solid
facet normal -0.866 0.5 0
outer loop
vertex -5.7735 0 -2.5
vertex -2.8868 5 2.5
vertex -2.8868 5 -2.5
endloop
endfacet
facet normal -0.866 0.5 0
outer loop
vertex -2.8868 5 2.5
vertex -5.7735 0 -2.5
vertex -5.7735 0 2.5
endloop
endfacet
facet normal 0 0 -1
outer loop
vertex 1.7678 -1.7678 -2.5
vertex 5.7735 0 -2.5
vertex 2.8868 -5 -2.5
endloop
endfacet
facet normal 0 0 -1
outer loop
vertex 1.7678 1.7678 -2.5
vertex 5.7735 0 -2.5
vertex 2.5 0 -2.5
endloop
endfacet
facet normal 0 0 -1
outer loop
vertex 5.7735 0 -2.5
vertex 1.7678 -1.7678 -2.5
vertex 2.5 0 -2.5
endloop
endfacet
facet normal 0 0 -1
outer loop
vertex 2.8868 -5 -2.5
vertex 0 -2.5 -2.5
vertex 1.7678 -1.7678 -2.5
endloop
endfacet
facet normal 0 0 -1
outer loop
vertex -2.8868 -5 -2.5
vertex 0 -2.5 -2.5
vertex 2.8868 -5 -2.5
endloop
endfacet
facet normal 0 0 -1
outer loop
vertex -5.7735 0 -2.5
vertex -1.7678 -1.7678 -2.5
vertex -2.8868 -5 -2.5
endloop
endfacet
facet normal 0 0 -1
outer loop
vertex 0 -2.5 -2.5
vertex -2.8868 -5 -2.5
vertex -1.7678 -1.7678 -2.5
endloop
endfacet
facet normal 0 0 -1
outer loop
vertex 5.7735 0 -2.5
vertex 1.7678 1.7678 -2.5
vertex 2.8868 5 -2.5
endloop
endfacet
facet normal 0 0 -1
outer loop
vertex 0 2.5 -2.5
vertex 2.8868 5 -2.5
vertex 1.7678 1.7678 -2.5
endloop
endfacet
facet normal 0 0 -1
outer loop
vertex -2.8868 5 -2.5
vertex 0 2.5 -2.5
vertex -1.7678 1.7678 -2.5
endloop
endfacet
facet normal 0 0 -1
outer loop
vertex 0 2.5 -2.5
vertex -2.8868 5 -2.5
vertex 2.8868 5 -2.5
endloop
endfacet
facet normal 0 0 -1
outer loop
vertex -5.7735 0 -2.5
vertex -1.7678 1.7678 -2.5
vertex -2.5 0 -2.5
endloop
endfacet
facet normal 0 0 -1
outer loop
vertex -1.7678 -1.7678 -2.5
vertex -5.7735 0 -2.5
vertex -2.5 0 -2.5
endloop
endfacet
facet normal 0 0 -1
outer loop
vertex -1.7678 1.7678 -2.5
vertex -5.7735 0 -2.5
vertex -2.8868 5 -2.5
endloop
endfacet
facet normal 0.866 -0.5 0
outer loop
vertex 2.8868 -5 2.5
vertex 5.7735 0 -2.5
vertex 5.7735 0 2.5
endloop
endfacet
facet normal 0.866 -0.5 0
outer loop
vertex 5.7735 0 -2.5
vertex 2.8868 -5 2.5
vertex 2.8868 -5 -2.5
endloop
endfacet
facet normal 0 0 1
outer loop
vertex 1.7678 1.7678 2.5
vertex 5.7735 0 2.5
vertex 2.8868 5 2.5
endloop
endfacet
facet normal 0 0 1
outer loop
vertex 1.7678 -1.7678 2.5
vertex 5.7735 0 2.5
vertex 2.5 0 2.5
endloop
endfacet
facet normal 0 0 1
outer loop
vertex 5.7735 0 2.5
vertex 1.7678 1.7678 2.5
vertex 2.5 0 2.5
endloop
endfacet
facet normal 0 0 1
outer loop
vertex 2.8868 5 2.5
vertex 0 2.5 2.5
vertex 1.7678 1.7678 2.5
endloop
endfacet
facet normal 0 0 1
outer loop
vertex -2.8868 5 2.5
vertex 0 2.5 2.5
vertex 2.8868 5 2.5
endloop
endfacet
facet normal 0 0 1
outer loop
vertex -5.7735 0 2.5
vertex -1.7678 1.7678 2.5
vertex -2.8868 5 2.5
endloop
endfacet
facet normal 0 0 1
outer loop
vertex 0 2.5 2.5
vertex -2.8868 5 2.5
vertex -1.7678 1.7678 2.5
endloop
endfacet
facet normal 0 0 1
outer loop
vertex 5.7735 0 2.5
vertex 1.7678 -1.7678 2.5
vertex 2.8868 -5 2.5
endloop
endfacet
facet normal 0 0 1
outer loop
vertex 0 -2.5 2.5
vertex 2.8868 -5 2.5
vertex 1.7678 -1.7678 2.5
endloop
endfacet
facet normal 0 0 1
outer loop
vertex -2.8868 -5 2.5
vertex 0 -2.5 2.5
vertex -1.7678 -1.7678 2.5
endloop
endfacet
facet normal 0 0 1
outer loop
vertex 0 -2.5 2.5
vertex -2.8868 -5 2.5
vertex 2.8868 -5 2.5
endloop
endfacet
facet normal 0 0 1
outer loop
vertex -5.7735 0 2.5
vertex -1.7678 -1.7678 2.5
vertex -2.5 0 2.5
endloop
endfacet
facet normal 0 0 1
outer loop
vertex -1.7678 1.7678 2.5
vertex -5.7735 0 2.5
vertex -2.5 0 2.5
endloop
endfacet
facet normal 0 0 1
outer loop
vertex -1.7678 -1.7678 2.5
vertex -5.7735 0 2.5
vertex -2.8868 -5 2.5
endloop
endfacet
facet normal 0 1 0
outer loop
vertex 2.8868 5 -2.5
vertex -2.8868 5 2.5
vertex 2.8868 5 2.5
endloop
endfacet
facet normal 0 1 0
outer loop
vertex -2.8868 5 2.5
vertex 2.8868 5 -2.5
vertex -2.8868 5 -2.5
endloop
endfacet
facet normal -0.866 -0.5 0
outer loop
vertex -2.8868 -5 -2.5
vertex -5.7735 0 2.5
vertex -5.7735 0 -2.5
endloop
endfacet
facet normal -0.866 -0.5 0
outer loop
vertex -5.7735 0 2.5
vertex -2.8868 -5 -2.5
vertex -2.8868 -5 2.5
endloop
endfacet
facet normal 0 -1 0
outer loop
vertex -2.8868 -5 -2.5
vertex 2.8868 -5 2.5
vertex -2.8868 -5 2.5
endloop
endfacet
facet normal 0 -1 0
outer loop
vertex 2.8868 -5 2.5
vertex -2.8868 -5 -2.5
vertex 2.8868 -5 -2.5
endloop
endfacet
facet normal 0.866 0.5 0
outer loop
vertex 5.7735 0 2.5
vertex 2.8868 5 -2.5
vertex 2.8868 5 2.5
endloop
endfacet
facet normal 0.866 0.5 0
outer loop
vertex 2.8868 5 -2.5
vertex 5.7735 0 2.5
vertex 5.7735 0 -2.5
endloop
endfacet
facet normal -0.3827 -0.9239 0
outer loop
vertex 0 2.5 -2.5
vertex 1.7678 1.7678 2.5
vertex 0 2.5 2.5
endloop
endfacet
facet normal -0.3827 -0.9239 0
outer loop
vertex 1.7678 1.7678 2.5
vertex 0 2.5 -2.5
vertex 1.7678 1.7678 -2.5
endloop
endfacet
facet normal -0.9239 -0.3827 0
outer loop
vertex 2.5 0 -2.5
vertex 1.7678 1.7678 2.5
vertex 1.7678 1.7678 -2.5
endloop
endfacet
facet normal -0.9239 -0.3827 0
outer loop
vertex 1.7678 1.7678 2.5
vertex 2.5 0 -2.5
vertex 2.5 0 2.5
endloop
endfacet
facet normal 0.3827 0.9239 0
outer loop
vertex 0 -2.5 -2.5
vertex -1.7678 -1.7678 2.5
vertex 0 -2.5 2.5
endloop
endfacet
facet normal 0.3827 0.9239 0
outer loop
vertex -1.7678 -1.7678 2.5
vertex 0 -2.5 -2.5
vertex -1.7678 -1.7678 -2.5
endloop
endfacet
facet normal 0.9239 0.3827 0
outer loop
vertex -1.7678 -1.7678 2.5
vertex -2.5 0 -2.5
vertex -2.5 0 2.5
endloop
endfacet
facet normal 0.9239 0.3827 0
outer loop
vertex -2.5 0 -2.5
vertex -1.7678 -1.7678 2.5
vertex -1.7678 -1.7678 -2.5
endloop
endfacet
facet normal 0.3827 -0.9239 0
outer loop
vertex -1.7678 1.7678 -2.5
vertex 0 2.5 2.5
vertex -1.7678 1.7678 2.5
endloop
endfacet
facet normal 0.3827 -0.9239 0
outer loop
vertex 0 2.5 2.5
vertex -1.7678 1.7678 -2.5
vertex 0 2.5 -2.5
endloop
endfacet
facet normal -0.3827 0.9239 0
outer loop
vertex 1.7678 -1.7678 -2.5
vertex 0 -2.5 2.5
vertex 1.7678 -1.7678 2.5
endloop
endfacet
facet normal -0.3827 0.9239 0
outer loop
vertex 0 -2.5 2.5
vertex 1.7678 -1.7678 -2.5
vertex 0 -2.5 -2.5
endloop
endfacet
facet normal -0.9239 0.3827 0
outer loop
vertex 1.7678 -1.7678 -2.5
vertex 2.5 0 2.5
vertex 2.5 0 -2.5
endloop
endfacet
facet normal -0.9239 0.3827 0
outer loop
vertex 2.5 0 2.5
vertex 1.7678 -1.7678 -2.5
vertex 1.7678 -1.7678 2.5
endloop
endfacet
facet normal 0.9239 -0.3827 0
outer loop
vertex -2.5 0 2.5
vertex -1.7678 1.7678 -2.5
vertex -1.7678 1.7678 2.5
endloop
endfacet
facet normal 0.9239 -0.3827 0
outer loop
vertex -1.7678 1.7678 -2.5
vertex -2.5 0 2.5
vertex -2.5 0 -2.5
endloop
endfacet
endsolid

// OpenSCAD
// Simple Hex Nut Model (No Threads)
// Author: AI Assistant
// Date: 2023-10-27

// --- Parameters ---

// Width of the hexagon measured between two parallel flat sides (mm)
hex_flat_to_flat_width = 10;

// Diameter of the central hole (mm)
hole_diameter = 5;

// Thickness (height) of the nut (mm)
nut_thickness = 5;


// --- Derived Variables ---

// Calculate the radius needed for a circle primitive to create a hexagon
// with the specified flat-to-flat width.
// The radius of the circumscribed circle of a hexagon is r = width / (2 * cos(30))
hex_radius = hex_flat_to_flat_width / (2 * cos(30));

// Calculate the radius of the central hole
hole_radius = hole_diameter / 2;


// --- Model Definition ---

// Use the difference() operation to subtract the hole from the hexagonal prism.
difference() {
    // 1. Create the outer hexagonal prism
    // Extrude a 2D hexagon along the Z-axis.
    // Center=true ensures the model is centered vertically around Z=0.
    linear_extrude(height = nut_thickness, center = true) {
        // Create a 2D hexagon centered at the origin (0,0).
        // Use circle() with $fn=6 to define the hexagon.
        // The radius is calculated to match the desired flat-to-flat width.
        circle(r = hex_radius, $fn = 6);
    }

    // 2. Create the cylinder for the central hole to be subtracted
    // Make the cylinder slightly taller than the nut thickness to ensure a clean boolean subtraction.
    // Center=true aligns it vertically with the hexagonal prism.
    linear_extrude(height = nut_thickness + 2, center = true) { // Add small epsilon (2mm total) for clean cut
        // Create a 2D circle for the hole, centered at the origin (0,0).
        // Use the calculated hole radius. Use default $fn for a smooth cylinder.
        circle(r = hole_radius);
    }
}

// End of script
